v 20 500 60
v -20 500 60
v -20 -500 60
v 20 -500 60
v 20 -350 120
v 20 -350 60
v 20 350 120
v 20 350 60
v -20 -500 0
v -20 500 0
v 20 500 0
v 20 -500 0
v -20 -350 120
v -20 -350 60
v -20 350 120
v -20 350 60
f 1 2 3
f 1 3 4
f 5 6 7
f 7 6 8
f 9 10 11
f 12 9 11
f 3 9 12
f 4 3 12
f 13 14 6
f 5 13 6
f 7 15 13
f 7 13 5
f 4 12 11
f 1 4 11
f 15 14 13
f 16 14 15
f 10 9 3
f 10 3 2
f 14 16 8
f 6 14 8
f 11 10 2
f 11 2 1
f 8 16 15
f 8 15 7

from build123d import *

# Parameters (mm, degrees)
F0_W     = 40
F0_H     = 1000
F1_DEPTH = 60
F2_W     = 40
F2_H     = 700
F3_DEPTH = 60


with BuildPart() as f1:
    # F0 (on Top) → F1 (new body)
    with BuildSketch(Plane.XY):
        Rectangle(F0_W, F0_H)
    extrude(amount=F1_DEPTH)


with BuildPart() as f3:
    # F2 (on face) → F3 (new body)
    with BuildSketch(Plane.XY.offset(60)):
        Rectangle(F2_W, F2_H)
    extrude(amount=F3_DEPTH)


solid = Compound([f1.part, f3.part])
